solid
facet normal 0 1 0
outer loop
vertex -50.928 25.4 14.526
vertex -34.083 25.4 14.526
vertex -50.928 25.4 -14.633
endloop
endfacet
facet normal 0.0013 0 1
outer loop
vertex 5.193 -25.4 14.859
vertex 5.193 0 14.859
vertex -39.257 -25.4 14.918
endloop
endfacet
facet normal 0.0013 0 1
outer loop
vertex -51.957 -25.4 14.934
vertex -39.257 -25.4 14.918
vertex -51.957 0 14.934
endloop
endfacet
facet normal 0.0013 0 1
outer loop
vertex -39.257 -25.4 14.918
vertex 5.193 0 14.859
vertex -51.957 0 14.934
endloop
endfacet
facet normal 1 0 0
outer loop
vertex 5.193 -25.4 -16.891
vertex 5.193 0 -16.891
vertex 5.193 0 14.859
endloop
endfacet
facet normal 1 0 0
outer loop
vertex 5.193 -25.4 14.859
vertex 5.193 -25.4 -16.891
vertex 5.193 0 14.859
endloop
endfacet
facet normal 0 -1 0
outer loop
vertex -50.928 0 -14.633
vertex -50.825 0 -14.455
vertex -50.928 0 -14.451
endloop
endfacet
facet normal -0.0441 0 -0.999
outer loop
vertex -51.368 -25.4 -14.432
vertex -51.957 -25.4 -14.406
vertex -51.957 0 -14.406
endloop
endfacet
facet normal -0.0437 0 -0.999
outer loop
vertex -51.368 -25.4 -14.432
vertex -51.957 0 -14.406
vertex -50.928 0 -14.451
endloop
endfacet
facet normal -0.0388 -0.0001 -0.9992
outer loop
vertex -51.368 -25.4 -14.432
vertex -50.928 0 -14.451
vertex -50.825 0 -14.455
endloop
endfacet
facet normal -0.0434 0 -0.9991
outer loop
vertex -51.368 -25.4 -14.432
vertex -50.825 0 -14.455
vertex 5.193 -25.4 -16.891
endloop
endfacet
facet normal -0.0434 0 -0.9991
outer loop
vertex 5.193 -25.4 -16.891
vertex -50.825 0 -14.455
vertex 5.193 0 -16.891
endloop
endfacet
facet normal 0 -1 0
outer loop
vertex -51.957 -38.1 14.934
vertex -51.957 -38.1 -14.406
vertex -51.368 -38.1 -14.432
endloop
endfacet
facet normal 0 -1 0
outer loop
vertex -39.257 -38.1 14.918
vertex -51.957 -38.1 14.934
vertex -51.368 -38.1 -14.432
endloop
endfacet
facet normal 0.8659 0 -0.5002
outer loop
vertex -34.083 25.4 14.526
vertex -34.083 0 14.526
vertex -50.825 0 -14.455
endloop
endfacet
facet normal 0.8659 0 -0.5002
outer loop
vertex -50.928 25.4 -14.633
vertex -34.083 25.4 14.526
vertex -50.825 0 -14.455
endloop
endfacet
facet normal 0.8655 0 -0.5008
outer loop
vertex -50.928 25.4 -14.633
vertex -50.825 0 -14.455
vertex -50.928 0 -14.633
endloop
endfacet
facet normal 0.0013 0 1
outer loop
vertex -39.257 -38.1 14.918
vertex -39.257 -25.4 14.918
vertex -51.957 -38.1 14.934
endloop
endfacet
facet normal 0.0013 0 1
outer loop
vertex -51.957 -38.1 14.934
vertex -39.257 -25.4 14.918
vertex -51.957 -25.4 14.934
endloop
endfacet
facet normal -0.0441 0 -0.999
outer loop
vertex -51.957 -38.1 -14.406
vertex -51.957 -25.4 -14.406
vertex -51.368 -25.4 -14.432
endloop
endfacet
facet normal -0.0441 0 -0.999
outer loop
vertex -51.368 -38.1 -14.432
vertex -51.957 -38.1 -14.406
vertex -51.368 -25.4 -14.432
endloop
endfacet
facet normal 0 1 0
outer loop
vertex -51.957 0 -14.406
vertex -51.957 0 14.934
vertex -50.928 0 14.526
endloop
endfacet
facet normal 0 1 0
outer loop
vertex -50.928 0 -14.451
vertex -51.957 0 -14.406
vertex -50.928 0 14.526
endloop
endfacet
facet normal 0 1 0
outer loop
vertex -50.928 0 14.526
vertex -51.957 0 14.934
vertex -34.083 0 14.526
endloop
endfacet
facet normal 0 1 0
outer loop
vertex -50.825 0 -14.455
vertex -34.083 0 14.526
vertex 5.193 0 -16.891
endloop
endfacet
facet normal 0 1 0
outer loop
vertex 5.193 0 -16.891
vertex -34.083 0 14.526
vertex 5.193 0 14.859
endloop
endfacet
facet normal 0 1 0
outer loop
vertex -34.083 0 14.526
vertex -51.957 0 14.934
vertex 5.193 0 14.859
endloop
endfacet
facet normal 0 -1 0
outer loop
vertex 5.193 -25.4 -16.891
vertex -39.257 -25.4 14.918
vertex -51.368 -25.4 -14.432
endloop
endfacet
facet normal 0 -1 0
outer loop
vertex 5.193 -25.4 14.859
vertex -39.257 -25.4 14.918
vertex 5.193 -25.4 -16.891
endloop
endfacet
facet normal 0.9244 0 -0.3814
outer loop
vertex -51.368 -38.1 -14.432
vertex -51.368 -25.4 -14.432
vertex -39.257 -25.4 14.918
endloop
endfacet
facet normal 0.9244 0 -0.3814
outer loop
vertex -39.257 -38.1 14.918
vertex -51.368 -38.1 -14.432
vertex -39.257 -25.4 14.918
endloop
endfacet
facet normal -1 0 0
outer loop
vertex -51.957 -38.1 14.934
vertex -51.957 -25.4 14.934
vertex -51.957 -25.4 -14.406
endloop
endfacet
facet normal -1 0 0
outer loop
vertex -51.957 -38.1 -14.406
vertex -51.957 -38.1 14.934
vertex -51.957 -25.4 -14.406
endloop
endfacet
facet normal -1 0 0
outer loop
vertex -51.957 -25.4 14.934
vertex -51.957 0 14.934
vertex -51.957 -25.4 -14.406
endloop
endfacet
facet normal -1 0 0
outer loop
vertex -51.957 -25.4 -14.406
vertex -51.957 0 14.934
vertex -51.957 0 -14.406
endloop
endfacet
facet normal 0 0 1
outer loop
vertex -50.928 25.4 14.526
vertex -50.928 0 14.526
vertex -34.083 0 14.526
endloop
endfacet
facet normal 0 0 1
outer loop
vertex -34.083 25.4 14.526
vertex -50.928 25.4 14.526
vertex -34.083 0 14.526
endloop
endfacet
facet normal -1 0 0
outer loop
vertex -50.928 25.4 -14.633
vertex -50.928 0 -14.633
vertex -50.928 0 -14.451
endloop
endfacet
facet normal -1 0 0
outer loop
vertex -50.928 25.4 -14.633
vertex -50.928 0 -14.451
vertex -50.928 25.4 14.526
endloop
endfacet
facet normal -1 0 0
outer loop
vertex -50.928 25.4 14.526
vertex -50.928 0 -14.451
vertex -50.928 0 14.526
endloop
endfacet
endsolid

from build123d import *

# Parameters (mm, degrees)
F2_DEPTH = 25.4
F4_DEPTH = 12.7
F7_DEPTH = 25.4


with BuildPart() as f2:
    # F1 (on Front) → F2 (new body)
    with BuildSketch(Plane.XZ):
        Polygon((5.1933536553, 14.8594833362), (-51.9565972747, 14.9343745474), (-51.9565972747, -14.4059932236), (5.1933536553, -16.8905166638), align=None)
    extrude(amount=F2_DEPTH)

    # F3 (on face) + F2_face1 (on face) → F4 (join)
    with BuildSketch(Plane.XZ.offset(25.4)):
        Polygon((-51.3677446578, -14.4315928628), (-39.2566081791, 14.917732056), (-51.9565972747, 14.9343745474), (-51.9565972747, -14.4059932236), align=None)
    with BuildSketch(Plane(origin=(-23.0059205639, 0, -0.3840757402), x_dir=(1, 0, 0), z_dir=(0, 1, 0))):
        Polygon((28.1992742193, -15.2435590764), (28.1992742193, 16.5064409236), (-28.9506767108, 14.0219174834), (-28.9506767108, -15.3184502876), align=None)
    extrude(amount=F4_DEPTH, dir=(0, -1, 0))

    # F6 (on face) → F7 (join)
    with BuildSketch(Plane(origin=(0, 0, 0), x_dir=(-1, 0, 0), z_dir=(0, 1, 0))):
        Polygon((34.0825431049, 14.5258735865), (50.9283207357, -14.6334338933), (50.9283207357, 14.5258735865), align=None)
    extrude(amount=F7_DEPTH)


solid = f2.part
